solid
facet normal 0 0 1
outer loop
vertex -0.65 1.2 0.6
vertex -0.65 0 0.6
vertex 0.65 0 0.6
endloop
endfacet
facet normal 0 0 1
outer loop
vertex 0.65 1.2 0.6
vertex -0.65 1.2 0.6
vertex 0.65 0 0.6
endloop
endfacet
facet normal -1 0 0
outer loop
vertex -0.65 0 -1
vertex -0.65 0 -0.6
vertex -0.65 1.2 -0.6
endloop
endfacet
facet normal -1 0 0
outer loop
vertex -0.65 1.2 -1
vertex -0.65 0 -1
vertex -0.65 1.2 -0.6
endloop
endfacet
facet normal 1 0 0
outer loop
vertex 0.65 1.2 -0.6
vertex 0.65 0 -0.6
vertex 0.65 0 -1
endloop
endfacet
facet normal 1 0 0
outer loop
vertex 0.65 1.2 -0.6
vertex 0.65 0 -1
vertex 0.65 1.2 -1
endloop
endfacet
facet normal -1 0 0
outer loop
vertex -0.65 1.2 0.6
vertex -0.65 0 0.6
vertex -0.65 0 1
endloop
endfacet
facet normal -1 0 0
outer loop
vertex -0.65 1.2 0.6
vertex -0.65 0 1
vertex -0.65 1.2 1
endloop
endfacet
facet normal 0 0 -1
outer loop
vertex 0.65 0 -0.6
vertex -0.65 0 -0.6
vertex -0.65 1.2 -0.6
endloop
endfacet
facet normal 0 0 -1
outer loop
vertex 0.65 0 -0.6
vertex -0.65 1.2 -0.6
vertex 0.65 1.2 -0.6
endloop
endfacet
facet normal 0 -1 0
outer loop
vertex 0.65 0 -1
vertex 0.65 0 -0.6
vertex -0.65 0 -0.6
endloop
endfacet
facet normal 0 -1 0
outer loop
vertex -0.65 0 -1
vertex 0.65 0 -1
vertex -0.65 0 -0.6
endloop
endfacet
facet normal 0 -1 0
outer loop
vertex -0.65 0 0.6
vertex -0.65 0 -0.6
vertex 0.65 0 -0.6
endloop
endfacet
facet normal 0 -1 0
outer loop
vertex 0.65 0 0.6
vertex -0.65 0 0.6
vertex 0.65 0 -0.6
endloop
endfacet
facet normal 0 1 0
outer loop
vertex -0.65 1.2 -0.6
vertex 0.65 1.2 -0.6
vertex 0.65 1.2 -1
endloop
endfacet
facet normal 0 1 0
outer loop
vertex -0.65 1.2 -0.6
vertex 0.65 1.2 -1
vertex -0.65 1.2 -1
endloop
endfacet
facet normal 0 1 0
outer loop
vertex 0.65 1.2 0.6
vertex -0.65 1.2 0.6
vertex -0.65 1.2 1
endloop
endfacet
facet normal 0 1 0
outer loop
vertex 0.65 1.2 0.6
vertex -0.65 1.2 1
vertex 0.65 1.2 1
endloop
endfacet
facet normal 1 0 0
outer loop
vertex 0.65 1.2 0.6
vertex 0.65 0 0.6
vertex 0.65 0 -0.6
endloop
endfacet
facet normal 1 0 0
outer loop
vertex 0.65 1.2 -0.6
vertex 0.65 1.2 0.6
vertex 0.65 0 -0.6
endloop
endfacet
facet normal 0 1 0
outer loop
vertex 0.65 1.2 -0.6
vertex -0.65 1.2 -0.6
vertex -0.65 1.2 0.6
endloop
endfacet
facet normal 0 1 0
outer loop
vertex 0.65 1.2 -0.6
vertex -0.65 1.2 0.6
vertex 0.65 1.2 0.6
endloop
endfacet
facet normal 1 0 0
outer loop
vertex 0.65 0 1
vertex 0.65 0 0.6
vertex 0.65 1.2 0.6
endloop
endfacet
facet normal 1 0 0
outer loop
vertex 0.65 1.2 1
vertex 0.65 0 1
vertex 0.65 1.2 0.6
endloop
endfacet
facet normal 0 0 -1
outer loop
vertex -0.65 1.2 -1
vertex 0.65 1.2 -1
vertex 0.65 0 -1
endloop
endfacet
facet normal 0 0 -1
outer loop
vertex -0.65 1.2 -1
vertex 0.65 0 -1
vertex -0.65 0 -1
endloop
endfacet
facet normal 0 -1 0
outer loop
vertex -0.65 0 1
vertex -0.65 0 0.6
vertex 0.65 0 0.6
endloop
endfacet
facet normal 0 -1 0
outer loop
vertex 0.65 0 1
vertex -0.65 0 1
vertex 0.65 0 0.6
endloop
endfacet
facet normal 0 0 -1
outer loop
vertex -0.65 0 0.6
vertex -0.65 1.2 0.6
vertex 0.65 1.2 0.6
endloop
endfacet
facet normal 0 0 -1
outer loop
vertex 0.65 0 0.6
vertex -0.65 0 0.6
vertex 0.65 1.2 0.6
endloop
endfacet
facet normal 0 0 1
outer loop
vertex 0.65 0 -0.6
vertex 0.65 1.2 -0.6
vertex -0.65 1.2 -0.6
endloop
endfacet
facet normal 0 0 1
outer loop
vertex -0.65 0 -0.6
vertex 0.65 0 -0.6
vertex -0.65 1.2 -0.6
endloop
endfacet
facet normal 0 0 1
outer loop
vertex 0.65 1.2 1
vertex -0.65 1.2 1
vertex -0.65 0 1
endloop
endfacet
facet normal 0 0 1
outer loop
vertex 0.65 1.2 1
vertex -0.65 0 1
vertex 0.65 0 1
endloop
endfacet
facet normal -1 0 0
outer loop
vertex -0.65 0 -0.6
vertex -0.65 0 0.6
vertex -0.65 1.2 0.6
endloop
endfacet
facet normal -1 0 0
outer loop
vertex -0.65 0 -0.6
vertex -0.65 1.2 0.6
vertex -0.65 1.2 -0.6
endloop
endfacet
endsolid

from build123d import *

# Parameters (mm, degrees)
SKETCH1_W  = 1.3
SKETCH1_H  = 1.2
MB_DEPTH   = 1.2
SKETCH2_W  = 1.3
SKETCH2_H  = 1.2
SB_L_DEPTH = 0.4
SKETCH3_W  = 1.3
SKETCH3_H  = 1.2
SB_R_DEPTH = 0.4


with BuildPart() as part:
    # Sketch1 → MB (new body)
    with BuildSketch(Plane(origin=(0, 0, 0), x_dir=(1, 0, 0), z_dir=(0, 1, 0))):
        Rectangle(SKETCH1_W, SKETCH1_H)
    extrude(amount=MB_DEPTH)


with BuildPart() as body_2:
    # Sketch2 → SB L (new body)
    with BuildSketch(Plane.XY.offset(0.6)):
        with Locations((0, 0.6)):
            Rectangle(SKETCH2_W, SKETCH2_H)
    extrude(amount=SB_L_DEPTH)


with BuildPart() as body_3:
    # Sketch3 → SB R (new body)
    with BuildSketch(Plane(origin=(0, 0, -0.6), x_dir=(-1, 0, 0), z_dir=(0, 0, -1))):
        with Locations((0, 0.6)):
            Rectangle(SKETCH3_W, SKETCH3_H)
    extrude(amount=SB_R_DEPTH)


solid = Compound([part.part, body_2.part, body_3.part])
